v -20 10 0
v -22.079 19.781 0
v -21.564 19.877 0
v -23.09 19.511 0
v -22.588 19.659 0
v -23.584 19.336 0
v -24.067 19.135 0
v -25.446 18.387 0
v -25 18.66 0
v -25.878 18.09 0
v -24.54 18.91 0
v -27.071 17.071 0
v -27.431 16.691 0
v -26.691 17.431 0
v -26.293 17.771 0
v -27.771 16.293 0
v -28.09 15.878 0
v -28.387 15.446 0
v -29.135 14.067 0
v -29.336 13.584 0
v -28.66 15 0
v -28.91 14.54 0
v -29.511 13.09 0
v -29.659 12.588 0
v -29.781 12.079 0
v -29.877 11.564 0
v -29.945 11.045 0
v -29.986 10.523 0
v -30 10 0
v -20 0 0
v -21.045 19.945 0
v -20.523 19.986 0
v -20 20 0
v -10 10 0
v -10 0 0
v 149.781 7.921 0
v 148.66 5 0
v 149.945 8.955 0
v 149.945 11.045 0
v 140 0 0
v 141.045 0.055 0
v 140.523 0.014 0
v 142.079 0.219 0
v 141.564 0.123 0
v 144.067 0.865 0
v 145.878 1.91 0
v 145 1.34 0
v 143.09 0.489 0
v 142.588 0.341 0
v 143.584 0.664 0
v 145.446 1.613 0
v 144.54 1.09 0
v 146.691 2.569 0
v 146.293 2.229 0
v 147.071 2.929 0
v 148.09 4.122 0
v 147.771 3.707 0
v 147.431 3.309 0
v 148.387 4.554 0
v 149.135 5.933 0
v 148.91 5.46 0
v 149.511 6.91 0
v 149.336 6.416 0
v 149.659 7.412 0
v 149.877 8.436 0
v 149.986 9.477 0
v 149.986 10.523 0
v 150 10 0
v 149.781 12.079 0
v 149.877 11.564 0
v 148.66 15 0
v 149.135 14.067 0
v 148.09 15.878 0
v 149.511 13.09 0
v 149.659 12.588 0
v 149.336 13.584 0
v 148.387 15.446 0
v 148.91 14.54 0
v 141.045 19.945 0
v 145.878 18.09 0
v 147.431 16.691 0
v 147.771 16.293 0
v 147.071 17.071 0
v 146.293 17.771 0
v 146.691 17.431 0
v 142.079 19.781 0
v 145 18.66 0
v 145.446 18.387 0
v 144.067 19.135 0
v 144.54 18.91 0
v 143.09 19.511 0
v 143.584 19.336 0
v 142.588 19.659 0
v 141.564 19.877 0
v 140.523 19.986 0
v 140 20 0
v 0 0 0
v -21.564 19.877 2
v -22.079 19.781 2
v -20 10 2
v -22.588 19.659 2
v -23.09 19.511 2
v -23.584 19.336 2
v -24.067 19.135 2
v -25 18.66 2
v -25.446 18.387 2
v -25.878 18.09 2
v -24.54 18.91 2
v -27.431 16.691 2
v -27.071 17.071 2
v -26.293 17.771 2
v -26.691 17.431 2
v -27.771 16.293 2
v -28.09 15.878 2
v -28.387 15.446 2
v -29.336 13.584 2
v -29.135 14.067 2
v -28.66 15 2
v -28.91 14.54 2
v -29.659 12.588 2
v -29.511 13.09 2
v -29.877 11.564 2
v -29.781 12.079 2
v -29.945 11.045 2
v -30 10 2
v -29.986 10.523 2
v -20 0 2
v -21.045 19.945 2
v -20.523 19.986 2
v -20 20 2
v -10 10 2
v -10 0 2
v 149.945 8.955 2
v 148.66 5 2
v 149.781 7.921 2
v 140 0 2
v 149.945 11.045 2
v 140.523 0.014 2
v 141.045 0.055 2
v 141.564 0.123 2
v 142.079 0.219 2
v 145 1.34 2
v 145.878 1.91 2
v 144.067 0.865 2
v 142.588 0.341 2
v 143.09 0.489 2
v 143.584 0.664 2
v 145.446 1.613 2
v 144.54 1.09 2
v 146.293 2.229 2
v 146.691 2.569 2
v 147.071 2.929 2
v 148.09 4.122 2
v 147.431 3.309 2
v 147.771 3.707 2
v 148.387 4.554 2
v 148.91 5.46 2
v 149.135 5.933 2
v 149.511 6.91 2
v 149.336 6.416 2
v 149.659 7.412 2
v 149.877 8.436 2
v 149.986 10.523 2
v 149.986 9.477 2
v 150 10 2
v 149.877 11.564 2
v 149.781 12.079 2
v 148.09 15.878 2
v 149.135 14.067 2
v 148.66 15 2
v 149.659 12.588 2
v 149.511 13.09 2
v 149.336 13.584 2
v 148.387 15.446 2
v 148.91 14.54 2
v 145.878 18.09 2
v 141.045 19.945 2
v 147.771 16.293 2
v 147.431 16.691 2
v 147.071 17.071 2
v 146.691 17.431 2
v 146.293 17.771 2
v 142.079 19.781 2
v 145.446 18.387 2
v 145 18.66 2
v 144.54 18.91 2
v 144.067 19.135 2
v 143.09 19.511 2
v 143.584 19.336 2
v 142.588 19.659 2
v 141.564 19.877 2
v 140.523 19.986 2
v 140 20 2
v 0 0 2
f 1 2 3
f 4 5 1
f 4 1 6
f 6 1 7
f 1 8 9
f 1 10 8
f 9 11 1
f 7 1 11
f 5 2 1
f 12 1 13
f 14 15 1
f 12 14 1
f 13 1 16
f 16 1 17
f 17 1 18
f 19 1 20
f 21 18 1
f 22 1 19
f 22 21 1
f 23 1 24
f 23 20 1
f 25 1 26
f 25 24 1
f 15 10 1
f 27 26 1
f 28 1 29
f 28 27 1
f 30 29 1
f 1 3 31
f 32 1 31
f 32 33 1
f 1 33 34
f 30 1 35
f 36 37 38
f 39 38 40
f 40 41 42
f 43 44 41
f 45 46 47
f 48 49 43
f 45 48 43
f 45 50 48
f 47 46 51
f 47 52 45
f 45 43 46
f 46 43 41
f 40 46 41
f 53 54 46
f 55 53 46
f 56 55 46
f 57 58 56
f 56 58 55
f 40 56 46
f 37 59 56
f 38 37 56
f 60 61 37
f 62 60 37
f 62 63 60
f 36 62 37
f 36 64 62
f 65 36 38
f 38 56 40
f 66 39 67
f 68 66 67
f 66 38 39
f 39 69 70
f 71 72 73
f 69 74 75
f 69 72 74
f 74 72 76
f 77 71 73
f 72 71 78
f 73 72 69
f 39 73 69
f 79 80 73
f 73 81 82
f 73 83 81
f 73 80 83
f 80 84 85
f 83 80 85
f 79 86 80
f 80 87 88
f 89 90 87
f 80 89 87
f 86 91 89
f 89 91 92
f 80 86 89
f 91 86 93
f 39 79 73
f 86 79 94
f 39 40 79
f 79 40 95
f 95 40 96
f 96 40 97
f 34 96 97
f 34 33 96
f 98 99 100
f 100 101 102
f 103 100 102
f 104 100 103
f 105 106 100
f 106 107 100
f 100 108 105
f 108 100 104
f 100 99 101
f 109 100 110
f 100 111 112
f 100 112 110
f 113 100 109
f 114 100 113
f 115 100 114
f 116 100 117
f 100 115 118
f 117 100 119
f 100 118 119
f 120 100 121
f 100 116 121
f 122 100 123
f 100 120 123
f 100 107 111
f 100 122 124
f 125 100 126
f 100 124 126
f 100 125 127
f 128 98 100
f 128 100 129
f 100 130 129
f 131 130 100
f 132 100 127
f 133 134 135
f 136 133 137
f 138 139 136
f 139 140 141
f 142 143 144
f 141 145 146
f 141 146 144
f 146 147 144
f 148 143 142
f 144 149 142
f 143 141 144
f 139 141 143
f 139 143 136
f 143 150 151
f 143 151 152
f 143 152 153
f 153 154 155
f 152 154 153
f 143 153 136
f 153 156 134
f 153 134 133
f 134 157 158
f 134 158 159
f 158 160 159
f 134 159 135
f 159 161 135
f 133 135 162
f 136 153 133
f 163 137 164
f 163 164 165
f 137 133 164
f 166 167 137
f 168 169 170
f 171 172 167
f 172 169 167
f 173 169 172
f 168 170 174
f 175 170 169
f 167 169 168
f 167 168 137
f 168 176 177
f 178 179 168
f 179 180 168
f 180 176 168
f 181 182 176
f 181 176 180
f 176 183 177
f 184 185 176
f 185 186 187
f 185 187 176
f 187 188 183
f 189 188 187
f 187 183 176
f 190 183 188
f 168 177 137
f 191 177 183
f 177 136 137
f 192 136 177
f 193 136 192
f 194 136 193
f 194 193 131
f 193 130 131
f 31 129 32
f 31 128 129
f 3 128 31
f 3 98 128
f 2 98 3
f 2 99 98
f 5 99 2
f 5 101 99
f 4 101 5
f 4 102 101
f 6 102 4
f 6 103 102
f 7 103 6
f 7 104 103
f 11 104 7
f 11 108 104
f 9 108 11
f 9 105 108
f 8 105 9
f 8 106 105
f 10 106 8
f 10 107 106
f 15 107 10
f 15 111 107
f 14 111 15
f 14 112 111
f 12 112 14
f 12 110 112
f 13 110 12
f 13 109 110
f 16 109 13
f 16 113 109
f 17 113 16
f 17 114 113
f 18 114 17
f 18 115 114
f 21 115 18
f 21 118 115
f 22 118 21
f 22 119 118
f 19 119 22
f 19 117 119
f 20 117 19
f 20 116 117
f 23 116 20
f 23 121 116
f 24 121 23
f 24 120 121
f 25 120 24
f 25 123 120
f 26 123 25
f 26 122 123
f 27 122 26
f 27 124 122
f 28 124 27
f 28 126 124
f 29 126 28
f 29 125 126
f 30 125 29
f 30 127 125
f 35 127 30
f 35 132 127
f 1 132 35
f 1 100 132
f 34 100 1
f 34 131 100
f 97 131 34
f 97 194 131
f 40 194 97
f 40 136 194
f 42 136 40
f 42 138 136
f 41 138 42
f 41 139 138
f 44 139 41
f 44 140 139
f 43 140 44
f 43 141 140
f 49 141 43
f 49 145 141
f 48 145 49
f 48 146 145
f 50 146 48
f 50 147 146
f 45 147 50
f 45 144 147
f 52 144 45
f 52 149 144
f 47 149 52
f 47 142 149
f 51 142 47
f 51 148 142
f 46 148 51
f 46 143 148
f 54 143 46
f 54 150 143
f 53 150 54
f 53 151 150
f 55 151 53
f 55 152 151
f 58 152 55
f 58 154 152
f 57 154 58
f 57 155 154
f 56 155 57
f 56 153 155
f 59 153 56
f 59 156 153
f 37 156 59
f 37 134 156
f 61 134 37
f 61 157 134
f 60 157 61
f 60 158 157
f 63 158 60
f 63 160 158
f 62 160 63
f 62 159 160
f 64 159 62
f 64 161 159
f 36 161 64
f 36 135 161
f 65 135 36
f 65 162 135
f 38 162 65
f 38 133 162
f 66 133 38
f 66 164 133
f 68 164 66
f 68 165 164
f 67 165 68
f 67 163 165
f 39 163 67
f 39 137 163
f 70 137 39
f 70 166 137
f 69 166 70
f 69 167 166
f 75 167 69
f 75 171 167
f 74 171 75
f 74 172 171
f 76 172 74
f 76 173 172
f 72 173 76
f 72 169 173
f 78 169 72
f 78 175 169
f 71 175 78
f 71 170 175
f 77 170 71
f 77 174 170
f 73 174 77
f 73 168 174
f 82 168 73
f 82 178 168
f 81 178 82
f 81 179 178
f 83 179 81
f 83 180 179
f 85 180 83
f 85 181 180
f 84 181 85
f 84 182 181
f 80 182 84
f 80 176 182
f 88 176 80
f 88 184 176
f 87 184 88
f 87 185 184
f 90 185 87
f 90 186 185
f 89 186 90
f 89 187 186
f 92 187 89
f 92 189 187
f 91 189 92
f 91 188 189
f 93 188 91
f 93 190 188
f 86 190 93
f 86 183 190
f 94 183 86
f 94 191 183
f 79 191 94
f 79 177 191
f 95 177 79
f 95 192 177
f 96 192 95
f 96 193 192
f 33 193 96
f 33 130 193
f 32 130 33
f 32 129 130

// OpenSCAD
//Hook to pull the grille from my bathroom floor.

$fn = 120;

linear_extrude(2) {
	square([140, 20]);
	translate([140, 10]) {
		circle(r=10);
	}
	translate([-20, 10]) {
		square([20, 10]);
	}
	intersection() {
		translate([-30, 10]) {
			square(10);
		}
		translate([-20, 10]) {
			circle(r=10);
		}
	}
	translate([-20, 0]) {
		multmatrix([[1, -1, 0, 0], [0, 1, 0, 0], [0, 0, 1, 0], [0, 0, 0, 1]]) {
			difference() {
				square([30, 10]);
				translate([10, 0]) {
					square(10);
				}
			}
		}
	}
}
